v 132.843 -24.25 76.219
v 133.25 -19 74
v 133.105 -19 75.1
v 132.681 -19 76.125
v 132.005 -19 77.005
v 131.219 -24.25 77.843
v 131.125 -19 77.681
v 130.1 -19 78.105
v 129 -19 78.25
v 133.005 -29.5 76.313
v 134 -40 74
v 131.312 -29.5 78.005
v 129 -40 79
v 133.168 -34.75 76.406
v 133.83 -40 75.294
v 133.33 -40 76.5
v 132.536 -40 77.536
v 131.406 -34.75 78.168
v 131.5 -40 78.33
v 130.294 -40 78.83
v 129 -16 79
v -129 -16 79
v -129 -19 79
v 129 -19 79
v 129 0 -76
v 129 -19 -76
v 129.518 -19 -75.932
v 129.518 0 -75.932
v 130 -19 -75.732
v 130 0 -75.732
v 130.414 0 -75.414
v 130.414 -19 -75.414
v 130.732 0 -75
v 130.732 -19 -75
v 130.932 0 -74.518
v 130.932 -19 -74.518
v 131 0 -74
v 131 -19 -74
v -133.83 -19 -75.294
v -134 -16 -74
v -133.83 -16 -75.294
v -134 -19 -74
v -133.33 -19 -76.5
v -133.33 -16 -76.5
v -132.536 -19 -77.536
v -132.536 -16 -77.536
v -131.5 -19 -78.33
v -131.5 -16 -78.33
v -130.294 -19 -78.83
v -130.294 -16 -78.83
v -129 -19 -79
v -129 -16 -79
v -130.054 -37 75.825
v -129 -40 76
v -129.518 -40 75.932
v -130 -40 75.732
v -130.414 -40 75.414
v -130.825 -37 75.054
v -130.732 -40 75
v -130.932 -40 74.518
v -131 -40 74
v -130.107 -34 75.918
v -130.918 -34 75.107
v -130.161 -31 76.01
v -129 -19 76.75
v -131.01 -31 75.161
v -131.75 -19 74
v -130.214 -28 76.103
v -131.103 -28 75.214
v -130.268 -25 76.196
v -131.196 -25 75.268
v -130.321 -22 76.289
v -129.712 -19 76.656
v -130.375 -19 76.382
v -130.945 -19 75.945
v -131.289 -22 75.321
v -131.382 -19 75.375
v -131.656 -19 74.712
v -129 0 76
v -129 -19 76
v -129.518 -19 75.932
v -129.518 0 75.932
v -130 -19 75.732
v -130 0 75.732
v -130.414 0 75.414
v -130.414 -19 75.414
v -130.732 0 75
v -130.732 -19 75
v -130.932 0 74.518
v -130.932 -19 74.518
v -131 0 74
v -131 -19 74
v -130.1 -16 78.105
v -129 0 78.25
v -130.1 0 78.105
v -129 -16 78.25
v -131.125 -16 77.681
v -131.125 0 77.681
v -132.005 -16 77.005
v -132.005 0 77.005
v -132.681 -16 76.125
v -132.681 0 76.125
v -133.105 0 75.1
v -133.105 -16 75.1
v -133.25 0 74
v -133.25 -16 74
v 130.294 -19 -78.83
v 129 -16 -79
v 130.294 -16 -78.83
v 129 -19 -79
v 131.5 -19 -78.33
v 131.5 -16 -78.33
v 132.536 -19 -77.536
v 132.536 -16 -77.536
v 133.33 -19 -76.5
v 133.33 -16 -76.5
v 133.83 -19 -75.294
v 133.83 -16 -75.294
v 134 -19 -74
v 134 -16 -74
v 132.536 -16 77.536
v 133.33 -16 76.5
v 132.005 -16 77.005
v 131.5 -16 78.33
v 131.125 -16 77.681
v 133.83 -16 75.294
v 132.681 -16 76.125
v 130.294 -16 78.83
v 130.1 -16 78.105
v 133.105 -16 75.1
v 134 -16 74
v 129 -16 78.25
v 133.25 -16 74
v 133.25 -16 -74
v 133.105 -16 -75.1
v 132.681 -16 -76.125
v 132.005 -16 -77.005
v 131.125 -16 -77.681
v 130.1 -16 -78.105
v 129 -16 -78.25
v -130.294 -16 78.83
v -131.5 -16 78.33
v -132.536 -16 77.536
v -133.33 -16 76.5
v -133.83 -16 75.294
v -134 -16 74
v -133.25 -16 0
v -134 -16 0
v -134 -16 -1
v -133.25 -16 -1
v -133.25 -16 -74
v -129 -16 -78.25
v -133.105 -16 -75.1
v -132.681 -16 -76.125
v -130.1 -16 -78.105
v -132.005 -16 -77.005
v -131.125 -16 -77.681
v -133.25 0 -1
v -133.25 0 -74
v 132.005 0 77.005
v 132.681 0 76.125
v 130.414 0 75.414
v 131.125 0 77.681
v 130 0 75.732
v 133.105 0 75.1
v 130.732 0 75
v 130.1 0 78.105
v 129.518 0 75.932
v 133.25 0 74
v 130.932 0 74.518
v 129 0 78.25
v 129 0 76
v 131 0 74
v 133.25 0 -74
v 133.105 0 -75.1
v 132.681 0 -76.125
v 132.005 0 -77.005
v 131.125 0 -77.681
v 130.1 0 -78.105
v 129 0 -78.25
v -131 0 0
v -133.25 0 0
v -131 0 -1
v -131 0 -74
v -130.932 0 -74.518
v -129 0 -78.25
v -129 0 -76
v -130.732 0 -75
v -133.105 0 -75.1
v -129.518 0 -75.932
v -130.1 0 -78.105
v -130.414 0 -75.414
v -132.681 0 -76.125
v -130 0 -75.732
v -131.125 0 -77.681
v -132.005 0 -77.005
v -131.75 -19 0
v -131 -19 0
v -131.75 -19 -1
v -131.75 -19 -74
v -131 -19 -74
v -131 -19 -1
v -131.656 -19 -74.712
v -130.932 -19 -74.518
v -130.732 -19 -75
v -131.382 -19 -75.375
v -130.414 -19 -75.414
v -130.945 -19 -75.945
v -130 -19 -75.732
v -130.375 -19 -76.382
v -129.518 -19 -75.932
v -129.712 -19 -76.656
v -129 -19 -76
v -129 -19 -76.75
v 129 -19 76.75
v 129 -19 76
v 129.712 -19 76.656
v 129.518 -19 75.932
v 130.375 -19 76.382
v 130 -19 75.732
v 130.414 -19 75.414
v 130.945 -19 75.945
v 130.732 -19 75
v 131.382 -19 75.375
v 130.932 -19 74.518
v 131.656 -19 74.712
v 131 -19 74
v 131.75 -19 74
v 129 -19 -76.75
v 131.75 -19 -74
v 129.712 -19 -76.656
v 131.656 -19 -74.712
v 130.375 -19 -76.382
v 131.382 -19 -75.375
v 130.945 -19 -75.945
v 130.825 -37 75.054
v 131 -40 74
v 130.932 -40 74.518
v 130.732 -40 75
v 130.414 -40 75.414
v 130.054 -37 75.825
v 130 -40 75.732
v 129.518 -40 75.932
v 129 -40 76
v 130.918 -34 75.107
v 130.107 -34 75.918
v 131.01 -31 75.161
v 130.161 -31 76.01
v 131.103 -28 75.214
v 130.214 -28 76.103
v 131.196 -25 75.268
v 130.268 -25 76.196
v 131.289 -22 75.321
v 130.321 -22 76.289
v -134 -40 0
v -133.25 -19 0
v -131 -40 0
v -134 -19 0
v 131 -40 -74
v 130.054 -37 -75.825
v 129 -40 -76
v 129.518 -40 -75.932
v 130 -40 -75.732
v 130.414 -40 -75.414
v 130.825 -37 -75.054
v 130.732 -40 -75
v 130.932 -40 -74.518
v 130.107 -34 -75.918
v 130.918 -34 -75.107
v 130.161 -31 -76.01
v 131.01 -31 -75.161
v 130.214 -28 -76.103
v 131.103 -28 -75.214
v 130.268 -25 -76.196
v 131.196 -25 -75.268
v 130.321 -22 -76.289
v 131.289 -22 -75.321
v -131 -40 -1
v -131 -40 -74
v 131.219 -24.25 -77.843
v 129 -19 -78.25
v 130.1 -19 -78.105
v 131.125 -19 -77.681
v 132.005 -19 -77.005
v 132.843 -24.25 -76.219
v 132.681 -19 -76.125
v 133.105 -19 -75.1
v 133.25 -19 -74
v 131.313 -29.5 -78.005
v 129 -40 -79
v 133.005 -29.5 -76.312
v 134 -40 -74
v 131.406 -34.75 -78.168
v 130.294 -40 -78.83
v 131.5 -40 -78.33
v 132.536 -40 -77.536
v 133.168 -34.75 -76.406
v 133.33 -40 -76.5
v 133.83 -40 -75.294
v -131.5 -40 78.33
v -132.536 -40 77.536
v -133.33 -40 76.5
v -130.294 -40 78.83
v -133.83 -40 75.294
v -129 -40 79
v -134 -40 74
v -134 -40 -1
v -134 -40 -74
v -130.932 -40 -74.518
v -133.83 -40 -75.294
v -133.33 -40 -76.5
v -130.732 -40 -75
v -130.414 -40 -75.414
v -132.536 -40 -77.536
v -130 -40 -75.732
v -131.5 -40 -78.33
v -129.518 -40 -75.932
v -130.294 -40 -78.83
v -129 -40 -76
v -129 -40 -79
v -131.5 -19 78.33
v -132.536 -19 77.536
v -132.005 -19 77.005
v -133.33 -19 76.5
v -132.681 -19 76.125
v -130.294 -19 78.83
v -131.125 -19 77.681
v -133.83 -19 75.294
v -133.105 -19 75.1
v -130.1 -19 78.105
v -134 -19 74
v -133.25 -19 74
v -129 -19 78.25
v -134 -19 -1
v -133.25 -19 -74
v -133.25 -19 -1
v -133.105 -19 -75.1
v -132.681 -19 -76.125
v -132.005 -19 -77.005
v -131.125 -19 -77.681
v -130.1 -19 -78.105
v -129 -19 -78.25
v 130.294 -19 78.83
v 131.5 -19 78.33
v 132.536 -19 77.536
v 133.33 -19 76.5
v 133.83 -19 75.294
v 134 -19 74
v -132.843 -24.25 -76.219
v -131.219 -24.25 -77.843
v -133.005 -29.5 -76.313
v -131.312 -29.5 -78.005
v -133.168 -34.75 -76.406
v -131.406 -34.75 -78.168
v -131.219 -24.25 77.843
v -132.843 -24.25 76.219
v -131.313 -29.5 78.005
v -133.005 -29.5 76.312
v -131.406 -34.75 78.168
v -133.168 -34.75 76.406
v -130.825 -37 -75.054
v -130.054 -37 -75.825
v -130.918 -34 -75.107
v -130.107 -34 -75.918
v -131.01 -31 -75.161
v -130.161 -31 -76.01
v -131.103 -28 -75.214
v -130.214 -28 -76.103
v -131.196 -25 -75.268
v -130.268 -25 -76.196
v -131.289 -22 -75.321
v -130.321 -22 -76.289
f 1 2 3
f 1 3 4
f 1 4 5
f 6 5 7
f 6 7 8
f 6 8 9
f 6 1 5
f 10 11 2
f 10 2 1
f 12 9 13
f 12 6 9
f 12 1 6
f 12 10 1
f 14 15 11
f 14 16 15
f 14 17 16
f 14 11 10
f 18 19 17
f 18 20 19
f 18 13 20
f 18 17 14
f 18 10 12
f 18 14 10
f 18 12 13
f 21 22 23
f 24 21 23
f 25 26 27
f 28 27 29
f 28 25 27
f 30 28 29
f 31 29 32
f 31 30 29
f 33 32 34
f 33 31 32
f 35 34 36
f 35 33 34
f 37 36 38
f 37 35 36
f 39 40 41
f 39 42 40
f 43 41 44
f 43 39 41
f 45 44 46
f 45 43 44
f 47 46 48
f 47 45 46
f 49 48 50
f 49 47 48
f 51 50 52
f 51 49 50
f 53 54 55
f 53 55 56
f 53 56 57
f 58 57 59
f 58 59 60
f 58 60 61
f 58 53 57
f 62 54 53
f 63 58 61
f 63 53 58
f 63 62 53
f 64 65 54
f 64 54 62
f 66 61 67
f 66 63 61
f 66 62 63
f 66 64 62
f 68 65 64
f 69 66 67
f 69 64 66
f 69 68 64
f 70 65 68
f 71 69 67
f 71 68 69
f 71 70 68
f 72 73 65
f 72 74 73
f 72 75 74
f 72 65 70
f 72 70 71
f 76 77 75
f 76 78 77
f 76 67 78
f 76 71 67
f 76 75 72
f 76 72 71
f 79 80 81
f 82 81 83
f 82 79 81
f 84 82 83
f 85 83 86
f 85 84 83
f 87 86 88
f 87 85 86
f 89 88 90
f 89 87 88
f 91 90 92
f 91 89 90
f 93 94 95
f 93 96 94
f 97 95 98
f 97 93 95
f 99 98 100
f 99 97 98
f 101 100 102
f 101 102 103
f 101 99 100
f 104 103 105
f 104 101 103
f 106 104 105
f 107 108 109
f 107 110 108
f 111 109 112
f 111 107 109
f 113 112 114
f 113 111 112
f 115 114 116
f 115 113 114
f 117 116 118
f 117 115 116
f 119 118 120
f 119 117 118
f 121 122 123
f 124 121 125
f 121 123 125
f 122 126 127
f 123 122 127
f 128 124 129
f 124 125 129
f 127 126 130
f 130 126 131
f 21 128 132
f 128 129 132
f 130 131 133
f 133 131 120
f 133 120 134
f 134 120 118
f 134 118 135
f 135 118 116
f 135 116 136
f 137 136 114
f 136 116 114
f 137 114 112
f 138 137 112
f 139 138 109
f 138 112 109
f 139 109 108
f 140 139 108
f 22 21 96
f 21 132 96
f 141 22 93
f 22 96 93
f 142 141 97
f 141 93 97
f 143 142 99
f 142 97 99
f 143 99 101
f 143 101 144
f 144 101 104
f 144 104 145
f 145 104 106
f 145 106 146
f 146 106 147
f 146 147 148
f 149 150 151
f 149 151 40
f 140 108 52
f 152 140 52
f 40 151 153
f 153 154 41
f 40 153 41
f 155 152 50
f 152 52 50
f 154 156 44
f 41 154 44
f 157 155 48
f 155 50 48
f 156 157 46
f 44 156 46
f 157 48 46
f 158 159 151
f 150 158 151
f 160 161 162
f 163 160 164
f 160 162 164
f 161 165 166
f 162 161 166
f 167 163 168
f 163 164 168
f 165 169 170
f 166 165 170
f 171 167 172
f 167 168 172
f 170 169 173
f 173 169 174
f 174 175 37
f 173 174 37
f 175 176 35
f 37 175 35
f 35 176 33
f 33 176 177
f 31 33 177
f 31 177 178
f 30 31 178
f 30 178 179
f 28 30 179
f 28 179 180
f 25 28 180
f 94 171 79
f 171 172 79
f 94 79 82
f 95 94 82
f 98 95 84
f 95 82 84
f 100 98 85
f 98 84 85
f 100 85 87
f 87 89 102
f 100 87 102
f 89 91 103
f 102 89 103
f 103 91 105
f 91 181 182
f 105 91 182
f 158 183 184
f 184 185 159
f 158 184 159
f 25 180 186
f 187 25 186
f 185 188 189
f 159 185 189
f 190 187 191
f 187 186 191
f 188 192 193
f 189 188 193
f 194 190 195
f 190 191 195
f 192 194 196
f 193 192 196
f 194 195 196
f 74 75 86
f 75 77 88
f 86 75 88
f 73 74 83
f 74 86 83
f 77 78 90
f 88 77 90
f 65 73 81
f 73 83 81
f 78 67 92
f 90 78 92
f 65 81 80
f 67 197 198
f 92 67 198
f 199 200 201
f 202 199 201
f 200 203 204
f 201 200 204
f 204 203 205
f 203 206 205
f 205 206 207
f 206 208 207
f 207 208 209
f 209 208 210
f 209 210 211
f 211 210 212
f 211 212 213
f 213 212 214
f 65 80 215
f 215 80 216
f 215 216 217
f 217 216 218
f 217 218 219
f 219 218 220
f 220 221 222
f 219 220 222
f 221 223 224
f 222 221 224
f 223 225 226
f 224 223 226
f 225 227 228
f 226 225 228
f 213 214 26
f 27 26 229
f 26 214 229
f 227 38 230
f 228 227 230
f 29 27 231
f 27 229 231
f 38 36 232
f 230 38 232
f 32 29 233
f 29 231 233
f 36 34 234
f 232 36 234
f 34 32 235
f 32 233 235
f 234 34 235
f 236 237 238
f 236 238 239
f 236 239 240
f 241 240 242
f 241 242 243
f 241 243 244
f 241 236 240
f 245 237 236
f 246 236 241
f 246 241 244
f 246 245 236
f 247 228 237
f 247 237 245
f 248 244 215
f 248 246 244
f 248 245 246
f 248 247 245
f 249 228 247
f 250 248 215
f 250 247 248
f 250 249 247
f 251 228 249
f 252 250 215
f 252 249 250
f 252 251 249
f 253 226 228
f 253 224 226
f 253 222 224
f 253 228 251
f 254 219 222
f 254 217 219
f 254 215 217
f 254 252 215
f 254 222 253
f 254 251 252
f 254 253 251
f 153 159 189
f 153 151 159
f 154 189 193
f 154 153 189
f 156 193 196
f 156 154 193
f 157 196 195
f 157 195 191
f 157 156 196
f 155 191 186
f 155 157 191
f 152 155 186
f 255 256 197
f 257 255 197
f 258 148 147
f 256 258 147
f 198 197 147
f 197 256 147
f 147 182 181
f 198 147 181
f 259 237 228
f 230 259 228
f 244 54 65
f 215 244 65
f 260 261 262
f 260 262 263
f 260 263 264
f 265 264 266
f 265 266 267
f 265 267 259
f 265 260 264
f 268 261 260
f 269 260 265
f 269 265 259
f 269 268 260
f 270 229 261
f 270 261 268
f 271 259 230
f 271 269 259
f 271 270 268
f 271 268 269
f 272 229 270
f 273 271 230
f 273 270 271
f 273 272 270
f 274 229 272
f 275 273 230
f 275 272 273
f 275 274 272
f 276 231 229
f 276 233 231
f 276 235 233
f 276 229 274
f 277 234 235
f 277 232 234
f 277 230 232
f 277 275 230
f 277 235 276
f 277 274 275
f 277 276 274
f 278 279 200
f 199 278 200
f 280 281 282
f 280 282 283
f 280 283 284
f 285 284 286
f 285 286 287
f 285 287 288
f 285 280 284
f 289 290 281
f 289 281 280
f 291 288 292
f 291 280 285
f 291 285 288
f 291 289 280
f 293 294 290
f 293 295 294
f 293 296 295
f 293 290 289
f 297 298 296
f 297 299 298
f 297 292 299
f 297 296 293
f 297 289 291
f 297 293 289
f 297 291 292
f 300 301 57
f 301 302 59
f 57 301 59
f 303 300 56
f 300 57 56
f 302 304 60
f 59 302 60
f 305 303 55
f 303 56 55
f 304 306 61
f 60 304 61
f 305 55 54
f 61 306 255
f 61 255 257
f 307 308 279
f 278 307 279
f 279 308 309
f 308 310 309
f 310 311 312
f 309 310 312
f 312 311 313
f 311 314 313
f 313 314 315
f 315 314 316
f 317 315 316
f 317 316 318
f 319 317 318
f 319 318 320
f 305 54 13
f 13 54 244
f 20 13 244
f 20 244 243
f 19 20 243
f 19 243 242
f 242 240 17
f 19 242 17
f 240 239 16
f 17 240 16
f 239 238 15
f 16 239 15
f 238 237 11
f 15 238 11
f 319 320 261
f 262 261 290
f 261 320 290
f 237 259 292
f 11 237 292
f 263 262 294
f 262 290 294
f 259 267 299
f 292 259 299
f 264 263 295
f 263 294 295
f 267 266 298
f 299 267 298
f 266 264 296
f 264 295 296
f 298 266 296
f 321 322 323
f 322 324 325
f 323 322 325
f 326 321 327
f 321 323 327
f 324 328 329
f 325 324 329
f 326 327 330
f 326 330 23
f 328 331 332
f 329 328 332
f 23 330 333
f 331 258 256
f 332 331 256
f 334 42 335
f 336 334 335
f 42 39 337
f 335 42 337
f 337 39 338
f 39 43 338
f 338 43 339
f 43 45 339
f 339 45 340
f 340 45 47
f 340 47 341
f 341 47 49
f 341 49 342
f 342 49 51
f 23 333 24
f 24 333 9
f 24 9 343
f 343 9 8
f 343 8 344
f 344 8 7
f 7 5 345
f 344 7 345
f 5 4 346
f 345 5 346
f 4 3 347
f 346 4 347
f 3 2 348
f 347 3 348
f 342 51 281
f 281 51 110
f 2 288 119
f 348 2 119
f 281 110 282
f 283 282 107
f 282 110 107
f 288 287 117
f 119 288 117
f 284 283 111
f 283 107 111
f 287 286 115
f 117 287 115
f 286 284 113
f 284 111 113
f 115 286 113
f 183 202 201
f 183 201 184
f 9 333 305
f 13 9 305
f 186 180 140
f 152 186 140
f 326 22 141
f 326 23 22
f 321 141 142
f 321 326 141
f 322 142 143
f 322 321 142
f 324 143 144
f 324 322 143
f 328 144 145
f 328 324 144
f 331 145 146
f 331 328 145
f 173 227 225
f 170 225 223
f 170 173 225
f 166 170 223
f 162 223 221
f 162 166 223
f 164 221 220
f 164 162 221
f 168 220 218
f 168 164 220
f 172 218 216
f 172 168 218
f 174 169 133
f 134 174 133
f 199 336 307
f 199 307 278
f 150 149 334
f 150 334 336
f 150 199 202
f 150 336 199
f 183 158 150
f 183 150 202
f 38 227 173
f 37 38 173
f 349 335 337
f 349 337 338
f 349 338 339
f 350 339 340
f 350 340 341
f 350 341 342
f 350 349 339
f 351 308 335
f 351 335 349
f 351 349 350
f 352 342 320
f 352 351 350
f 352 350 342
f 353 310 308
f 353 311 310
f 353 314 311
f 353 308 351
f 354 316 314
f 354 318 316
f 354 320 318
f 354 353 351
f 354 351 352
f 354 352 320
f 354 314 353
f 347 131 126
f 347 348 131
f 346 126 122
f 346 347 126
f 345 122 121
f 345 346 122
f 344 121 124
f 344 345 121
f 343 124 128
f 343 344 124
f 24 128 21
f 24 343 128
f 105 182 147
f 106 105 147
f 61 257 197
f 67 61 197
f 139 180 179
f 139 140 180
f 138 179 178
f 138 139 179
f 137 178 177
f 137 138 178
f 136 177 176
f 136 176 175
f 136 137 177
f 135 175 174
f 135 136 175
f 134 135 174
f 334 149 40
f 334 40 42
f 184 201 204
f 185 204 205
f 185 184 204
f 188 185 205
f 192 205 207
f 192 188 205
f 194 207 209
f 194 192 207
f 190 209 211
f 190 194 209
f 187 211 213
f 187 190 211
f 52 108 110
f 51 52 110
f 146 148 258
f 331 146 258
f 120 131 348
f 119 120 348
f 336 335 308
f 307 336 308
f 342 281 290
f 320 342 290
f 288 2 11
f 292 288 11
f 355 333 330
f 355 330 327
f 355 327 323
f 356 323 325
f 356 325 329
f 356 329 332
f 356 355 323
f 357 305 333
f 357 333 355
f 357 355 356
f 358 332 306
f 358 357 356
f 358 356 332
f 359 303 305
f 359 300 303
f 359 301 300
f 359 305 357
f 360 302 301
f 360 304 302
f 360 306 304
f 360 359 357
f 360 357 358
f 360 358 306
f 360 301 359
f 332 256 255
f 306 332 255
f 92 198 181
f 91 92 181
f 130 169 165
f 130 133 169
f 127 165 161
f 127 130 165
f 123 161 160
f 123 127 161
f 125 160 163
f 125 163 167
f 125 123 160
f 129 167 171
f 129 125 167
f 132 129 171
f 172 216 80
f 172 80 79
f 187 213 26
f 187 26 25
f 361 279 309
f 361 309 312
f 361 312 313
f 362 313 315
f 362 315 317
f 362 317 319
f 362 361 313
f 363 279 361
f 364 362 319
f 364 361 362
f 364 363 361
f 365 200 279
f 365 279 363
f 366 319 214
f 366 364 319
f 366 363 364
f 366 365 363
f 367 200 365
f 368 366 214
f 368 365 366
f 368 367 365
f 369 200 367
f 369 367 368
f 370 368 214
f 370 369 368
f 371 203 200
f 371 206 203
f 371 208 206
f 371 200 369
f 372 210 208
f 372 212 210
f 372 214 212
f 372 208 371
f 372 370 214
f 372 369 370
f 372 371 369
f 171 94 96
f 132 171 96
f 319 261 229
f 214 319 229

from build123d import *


with BuildPart() as part:
    # Sweep1: sweep along a path in Sketch1
    with BuildLine(Plane(origin=(0, 0, 0), x_dir=(1, 0, 0), z_dir=(0, 1, 0))) as sweep1_path:
        Line((-131, 1), (-131, 74))
        ThreePointArc((-131, 74), (-130.414213562, 75.414213562), (-129, 76))
        Line((-129, 76), (129, 76))
        ThreePointArc((129, 76), (130.414213562, 75.414213562), (131, 74))
        Line((131, 74), (131, -74))
        ThreePointArc((131, -74), (130.414213562, -75.414213562), (129, -76))
        Line((129, -76), (-129, -76))
        ThreePointArc((-129, -76), (-130.414213562, -75.414213562), (-131, -74))
        Line((-131, -74), (-131, 0))
    # Sketch2 → Sweep1 (sweep)
    with BuildSketch(Plane.XY):
        Polygon((-131, 0), (-131, -19), (-131.75, -19), (-131, -40), (-134, -40), (-133.25, -19), (-134, -19), (-134, -16), (-133.25, -16), (-133.25, 0), align=None)
    sweep(path=sweep1_path.line)


solid = part.part
